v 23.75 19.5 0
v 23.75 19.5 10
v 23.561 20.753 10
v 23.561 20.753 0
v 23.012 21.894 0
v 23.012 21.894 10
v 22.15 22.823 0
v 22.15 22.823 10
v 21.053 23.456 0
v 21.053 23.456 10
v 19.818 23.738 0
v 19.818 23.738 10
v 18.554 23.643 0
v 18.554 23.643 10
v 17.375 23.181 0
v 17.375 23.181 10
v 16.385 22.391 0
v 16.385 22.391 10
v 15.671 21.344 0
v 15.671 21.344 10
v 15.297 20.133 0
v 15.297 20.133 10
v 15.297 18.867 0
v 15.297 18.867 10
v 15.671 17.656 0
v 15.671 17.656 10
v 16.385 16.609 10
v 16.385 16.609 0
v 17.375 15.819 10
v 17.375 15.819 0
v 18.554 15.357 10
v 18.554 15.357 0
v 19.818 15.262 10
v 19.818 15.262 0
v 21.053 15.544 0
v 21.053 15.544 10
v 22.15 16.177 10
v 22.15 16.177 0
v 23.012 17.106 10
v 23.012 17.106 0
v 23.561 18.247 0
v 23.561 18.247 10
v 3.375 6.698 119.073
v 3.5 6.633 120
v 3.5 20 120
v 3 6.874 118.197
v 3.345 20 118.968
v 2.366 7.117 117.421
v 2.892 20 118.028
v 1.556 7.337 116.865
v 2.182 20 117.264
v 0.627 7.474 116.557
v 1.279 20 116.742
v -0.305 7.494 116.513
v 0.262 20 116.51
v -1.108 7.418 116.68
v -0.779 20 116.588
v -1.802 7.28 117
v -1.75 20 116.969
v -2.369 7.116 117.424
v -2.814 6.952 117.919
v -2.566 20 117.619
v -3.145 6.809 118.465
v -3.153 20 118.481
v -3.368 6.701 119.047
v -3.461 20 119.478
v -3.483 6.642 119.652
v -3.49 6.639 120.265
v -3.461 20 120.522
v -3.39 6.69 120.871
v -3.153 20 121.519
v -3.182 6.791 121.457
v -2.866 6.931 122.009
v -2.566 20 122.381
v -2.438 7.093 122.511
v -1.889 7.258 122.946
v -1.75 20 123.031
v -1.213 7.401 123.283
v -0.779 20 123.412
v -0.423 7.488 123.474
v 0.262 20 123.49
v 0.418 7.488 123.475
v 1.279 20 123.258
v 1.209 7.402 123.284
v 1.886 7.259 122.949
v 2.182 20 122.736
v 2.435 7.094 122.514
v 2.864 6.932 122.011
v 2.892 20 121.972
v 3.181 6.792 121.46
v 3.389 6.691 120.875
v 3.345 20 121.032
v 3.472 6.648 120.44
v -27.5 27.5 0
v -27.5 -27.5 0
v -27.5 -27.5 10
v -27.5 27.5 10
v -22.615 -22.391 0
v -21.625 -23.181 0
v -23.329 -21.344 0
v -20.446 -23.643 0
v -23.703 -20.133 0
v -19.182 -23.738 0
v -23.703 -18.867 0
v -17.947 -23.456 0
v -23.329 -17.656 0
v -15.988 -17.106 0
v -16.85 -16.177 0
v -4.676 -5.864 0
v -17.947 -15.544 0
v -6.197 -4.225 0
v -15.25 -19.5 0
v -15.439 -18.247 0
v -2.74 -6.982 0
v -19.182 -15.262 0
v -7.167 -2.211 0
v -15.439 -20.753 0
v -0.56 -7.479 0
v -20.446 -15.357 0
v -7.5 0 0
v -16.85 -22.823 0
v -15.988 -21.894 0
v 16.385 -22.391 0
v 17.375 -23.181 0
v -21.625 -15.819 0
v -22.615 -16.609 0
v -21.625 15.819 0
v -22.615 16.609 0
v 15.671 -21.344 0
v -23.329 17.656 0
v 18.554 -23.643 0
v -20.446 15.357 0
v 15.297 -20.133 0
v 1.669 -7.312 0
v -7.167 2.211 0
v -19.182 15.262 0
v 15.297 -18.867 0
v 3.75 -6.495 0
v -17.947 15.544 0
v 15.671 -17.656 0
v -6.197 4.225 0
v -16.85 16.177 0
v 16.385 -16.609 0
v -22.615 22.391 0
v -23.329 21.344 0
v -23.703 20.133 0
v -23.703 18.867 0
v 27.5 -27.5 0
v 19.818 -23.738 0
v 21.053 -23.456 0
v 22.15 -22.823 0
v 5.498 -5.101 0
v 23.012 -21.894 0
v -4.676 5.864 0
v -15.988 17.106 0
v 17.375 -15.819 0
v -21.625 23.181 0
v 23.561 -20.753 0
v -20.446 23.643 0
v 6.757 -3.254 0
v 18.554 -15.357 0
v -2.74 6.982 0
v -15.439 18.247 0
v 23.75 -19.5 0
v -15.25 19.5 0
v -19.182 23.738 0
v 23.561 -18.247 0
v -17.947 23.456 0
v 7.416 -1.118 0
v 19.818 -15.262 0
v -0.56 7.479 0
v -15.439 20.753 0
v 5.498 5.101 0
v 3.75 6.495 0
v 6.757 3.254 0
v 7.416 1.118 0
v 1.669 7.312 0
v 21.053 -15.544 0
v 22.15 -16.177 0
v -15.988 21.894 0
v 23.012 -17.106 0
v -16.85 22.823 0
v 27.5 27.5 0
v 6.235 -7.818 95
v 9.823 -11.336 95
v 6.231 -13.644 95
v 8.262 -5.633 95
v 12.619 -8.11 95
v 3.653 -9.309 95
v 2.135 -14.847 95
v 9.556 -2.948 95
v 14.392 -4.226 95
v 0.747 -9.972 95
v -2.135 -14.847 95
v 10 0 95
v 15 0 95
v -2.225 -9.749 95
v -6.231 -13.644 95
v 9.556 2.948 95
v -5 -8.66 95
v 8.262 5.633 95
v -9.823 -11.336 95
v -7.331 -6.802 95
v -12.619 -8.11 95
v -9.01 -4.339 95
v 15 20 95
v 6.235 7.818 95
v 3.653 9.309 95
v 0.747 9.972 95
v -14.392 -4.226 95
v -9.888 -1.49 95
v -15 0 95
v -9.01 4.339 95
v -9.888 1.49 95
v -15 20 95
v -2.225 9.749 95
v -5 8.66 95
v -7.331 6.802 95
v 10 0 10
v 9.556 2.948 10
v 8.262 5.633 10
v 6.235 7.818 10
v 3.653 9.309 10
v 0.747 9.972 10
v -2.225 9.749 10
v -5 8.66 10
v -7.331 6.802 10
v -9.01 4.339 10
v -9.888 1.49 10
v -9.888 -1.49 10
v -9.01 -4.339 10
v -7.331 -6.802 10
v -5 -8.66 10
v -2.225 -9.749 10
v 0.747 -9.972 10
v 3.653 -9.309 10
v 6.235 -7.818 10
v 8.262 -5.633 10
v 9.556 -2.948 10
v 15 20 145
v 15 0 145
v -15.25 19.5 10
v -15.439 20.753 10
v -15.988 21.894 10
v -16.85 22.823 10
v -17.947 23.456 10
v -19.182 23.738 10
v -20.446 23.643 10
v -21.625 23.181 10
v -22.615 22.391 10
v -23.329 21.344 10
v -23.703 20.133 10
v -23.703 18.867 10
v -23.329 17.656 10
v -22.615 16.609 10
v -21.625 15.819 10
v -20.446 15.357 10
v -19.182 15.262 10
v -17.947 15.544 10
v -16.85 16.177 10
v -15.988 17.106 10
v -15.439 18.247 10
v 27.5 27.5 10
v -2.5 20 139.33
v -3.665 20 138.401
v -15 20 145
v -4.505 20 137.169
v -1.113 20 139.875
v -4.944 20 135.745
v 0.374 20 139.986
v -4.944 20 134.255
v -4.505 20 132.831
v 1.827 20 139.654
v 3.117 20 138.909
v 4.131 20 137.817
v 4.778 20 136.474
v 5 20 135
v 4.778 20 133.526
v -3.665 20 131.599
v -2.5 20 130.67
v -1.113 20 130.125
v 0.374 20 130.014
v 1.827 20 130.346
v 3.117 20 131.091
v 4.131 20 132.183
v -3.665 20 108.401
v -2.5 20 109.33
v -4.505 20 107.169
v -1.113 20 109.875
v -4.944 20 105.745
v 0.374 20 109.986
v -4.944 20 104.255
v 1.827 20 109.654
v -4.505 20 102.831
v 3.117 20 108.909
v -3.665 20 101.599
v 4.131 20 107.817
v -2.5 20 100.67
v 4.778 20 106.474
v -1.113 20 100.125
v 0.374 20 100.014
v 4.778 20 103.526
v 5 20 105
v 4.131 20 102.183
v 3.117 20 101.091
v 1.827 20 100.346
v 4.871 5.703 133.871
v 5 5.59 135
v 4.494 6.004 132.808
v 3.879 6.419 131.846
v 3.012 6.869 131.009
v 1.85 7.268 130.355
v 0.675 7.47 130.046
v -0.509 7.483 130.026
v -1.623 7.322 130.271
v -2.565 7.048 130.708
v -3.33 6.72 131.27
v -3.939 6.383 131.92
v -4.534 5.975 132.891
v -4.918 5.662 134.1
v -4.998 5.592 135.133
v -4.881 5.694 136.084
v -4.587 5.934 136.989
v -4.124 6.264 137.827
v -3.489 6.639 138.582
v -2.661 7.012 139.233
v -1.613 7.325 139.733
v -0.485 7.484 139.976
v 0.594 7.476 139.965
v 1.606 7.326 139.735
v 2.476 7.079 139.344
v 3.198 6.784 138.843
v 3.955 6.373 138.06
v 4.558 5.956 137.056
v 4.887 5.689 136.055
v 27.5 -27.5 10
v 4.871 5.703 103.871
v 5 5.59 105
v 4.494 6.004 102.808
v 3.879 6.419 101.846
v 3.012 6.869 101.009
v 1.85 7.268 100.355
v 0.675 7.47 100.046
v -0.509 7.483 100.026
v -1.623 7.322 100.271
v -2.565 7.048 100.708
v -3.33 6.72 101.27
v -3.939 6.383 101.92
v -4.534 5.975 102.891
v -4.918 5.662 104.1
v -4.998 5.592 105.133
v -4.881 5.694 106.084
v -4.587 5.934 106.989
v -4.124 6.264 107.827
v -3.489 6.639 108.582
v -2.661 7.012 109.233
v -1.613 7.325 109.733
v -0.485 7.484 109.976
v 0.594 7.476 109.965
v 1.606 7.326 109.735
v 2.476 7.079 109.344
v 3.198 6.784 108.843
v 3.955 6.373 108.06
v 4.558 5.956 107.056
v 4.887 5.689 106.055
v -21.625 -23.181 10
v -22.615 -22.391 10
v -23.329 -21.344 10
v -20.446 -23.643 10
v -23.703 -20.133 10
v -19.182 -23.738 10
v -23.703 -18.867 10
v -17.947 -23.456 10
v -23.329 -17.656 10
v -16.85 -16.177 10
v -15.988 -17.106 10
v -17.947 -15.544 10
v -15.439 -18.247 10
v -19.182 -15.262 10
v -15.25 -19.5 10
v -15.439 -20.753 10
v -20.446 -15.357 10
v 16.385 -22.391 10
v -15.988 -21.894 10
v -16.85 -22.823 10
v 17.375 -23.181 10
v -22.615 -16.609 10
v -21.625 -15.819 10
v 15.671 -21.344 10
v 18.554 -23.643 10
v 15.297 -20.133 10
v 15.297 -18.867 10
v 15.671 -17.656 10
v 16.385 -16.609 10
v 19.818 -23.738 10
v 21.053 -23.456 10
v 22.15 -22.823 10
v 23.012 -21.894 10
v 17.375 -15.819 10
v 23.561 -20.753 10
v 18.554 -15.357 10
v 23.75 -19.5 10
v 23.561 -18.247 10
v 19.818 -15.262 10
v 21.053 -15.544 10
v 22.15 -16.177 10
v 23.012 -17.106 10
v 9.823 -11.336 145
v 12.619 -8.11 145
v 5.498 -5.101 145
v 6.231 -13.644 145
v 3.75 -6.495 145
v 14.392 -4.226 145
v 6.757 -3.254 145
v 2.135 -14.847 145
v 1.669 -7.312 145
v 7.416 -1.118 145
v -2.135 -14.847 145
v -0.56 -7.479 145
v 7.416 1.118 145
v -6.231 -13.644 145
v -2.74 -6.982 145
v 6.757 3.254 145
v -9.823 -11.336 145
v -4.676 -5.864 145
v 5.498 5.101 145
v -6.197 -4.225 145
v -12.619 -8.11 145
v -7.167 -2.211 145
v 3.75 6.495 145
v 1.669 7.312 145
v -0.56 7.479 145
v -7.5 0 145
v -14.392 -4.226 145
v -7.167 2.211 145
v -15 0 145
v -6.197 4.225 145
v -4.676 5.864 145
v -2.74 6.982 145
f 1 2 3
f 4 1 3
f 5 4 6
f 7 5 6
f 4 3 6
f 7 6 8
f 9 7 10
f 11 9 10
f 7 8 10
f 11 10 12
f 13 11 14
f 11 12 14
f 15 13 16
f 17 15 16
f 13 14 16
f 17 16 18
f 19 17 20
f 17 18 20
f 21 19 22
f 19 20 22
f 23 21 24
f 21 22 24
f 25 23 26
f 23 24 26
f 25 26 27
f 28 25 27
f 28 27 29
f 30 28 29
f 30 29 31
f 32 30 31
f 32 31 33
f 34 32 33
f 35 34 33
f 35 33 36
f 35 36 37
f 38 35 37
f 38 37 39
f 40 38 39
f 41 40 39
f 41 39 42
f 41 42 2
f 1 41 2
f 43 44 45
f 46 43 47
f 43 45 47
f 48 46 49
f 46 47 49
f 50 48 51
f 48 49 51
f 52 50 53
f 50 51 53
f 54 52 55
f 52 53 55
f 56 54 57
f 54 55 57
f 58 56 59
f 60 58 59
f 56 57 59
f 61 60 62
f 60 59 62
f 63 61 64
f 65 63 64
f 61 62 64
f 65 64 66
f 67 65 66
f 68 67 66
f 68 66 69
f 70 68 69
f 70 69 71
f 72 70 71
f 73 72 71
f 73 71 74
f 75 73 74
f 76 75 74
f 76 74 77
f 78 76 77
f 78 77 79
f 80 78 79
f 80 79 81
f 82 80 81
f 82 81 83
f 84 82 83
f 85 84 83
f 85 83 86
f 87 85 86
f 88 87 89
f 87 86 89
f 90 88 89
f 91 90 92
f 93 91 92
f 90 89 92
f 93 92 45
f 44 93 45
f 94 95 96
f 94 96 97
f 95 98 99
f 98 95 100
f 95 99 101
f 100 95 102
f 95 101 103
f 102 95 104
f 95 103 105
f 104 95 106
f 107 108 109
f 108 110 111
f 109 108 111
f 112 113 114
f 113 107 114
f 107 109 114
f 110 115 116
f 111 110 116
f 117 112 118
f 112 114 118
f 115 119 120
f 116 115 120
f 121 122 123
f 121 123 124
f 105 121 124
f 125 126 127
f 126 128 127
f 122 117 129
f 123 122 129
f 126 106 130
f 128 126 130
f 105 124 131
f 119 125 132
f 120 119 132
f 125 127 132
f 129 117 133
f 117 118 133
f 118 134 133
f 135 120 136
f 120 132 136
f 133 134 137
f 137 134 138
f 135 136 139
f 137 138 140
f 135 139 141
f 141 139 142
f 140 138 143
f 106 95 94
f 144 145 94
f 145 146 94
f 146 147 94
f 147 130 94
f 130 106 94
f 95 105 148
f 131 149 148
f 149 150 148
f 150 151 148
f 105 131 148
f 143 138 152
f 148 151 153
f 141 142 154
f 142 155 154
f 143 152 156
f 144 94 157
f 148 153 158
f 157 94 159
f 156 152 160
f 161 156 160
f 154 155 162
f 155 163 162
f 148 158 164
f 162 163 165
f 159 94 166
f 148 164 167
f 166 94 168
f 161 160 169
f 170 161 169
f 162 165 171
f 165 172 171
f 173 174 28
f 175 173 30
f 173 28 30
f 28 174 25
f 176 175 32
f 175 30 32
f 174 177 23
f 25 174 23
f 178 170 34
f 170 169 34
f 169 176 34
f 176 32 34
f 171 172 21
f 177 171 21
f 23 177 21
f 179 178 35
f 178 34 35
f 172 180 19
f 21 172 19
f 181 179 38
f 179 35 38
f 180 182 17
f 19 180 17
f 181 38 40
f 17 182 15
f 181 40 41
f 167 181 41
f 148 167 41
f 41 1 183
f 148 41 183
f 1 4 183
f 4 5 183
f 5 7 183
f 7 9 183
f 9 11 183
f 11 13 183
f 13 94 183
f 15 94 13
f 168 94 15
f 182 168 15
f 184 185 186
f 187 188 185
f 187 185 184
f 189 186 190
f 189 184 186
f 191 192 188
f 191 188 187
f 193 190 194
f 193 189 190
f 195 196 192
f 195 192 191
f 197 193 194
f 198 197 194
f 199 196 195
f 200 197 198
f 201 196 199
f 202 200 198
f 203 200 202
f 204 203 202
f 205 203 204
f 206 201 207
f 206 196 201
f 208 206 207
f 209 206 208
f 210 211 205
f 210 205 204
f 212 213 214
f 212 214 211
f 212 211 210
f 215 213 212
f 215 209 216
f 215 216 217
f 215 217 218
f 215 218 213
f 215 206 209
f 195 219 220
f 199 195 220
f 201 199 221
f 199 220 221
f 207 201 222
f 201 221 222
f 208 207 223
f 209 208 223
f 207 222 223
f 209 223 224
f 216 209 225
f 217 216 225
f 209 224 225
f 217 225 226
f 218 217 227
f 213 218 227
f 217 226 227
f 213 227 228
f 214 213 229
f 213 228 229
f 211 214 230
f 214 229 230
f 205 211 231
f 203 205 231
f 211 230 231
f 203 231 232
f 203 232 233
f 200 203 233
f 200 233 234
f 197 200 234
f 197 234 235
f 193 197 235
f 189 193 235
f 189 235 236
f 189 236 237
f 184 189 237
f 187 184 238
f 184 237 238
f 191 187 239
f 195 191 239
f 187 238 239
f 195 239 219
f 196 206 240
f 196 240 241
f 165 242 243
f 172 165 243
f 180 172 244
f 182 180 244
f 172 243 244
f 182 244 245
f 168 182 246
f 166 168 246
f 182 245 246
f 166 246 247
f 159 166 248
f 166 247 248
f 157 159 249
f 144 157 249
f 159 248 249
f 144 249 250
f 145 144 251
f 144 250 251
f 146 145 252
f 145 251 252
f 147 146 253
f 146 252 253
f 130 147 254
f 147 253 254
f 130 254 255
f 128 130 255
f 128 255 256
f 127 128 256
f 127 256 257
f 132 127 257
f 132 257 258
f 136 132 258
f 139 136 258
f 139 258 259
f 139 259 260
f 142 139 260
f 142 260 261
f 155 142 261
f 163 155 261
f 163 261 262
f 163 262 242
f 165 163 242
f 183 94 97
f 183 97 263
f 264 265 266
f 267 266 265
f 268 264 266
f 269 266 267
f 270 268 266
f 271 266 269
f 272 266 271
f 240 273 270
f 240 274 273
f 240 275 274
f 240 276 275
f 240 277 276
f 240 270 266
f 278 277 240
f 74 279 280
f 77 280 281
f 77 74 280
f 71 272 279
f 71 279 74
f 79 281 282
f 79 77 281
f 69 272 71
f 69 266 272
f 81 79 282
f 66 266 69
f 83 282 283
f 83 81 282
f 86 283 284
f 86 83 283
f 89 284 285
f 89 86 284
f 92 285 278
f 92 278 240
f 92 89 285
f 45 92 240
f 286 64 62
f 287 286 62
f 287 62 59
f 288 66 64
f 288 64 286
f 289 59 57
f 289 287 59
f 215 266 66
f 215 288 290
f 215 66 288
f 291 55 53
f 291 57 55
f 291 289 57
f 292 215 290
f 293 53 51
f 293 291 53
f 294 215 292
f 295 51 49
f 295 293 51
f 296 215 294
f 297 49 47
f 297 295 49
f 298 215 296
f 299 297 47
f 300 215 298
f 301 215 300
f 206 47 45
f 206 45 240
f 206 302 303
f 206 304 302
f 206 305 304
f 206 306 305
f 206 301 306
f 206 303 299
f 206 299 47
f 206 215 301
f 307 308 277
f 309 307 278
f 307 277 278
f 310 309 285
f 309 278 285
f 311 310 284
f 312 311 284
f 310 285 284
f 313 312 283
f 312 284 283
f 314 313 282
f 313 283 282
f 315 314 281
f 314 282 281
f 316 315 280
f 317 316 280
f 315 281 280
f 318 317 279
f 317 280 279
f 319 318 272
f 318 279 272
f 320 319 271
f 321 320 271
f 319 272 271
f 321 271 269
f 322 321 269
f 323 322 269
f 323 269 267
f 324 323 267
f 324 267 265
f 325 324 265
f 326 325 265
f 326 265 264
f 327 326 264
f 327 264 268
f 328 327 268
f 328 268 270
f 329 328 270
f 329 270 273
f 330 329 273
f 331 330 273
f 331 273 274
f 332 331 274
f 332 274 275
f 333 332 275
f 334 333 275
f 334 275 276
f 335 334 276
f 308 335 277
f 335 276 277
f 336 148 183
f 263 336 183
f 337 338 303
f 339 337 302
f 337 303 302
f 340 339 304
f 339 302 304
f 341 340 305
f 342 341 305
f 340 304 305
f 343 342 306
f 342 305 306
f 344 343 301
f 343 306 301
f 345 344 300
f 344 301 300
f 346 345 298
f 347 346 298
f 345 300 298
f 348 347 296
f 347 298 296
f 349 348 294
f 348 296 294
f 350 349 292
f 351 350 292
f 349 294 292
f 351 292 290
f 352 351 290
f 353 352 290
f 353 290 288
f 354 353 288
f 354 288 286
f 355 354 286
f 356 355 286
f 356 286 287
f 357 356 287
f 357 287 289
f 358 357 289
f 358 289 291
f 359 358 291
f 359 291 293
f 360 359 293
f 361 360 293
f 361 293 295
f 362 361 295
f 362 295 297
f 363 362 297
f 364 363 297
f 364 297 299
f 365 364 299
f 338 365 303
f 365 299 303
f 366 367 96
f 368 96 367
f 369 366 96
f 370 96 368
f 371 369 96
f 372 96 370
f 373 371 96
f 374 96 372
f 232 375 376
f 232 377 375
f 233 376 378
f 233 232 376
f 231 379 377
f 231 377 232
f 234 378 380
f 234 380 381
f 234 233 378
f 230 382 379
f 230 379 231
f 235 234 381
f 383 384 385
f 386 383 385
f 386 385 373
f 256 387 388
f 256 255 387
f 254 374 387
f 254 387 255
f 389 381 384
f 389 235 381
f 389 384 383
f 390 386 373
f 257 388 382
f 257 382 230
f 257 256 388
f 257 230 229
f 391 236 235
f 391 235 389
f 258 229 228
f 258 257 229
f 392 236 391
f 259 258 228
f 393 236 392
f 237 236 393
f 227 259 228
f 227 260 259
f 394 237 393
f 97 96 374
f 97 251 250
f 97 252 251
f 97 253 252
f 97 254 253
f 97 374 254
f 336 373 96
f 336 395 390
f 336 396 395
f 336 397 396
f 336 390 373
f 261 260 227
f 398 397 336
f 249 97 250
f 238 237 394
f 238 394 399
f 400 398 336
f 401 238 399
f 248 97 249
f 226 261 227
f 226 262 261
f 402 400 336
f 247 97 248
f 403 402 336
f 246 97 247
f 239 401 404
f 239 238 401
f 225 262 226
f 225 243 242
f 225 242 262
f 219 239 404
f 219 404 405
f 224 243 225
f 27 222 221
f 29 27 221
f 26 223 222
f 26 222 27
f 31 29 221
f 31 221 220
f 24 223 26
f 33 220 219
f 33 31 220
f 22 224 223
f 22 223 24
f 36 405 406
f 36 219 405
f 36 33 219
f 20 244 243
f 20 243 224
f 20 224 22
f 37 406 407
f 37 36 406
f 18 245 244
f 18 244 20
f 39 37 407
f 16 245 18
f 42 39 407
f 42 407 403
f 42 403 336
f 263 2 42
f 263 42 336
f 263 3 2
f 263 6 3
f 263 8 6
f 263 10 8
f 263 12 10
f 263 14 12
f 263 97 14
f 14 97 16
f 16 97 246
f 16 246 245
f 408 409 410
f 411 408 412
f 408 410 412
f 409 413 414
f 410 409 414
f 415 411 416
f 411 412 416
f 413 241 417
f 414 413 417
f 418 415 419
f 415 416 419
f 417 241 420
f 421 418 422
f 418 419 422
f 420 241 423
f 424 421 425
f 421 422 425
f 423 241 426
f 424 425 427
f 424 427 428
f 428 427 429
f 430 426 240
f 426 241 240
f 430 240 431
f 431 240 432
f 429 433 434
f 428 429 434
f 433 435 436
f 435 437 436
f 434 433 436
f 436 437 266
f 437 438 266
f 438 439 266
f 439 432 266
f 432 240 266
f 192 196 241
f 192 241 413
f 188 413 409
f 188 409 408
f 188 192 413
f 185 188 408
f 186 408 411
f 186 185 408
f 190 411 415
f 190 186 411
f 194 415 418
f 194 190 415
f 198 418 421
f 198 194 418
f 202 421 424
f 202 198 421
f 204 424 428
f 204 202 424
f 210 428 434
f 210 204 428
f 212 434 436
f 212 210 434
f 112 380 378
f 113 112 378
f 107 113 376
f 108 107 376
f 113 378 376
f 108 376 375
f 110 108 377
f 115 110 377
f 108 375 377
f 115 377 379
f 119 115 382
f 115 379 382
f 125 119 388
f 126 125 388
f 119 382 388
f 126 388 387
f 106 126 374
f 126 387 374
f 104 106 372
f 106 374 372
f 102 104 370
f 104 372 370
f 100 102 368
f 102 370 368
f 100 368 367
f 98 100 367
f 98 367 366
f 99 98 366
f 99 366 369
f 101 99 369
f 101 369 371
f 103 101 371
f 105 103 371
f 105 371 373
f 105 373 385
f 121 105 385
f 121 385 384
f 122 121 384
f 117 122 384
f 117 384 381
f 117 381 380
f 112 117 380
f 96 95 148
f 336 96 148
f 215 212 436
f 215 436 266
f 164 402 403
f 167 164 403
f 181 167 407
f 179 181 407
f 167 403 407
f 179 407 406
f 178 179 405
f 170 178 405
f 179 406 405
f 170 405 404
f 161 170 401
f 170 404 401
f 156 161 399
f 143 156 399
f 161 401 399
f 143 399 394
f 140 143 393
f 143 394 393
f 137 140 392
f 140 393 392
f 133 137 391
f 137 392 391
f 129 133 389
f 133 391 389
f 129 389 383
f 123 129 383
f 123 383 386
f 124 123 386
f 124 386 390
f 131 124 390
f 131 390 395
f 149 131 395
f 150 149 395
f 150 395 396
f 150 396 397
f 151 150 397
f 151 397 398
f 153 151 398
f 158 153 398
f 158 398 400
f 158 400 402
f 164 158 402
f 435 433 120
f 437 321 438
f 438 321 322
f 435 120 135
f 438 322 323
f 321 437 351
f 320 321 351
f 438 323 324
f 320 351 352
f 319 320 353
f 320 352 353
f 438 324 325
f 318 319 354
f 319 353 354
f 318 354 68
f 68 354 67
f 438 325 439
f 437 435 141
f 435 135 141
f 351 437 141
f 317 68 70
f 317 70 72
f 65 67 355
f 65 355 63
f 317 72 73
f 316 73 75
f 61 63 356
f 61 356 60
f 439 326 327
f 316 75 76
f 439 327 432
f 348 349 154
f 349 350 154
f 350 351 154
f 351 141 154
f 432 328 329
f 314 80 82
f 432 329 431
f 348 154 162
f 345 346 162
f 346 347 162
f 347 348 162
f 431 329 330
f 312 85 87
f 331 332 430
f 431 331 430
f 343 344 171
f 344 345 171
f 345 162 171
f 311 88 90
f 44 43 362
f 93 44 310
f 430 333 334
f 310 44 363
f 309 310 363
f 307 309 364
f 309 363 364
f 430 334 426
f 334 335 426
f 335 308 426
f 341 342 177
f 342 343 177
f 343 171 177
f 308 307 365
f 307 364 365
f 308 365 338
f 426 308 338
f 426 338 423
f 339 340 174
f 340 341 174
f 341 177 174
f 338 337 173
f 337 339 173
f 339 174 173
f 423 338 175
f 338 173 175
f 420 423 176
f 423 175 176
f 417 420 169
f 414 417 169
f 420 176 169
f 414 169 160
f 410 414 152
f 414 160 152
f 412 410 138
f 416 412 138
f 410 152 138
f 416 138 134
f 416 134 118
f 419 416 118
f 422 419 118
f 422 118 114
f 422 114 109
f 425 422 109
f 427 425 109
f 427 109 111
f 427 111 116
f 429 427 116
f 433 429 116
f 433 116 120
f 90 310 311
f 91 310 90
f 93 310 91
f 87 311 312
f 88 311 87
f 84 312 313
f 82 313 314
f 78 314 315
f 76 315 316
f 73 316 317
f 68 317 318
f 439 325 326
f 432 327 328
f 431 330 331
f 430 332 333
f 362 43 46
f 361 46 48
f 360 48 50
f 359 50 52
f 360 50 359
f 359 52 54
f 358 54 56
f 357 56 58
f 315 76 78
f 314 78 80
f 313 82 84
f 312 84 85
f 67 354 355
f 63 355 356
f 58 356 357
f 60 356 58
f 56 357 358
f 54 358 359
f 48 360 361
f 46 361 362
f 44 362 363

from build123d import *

# Parameters (mm, degrees)
SKETCH1_W               = 55
SKETCH1_H               = 55
BOSS_EXTRUDE1_DEPTH     = 10
SKETCH2_R               = 10
BOSS_EXTRUDE2_DEPTH     = 85
BOSS_EXTRUDE3_DEPTH     = 50
SKETCH4_R               = 7.5
CUT_EXTRUDE1_DEPTH      = 1
CUT_EXTRUDE1_DEPTH_BACK = 146
CUT_EXTRUDE2_REACH      = 49.5
SKETCH5_R               = 5
SKETCH5_R_2             = 3.5
SKETCH6_R               = 4.25
CUT_EXTRUDE3_DEPTH      = 50


with BuildPart() as part:
    # Sketch1 → Boss-Extrude1 (new body)
    with BuildSketch(Plane.XY):
        Rectangle(SKETCH1_W, SKETCH1_H)
    extrude(amount=BOSS_EXTRUDE1_DEPTH)

    # Sketch2 → Boss-Extrude2 (add)
    with BuildSketch(Plane.XY.offset(10)):
        Circle(SKETCH2_R)
    extrude(amount=BOSS_EXTRUDE2_DEPTH)

    # Sketch3 → Boss-Extrude3 (add)
    with BuildSketch(Plane.XY.offset(95)):
        with BuildLine():
            Line((-15, 0), (-15, 20))
            Line((-15, 20), (15, 20))
            Line((15, 20), (15, 0))
            ThreePointArc((15, 0), (0, -15), (-15, 0))
        make_face()
    extrude(amount=BOSS_EXTRUDE3_DEPTH)

    # Sketch4 → Cut-Extrude1 (cut, two sides)
    with BuildSketch(Plane(origin=(0, 0, 0), x_dir=(-1, 0, 0), z_dir=(0, 0, -1))) as cut_extrude1_sk:
        Circle(SKETCH4_R)
    extrude(amount=CUT_EXTRUDE1_DEPTH, mode=Mode.SUBTRACT)
    extrude(cut_extrude1_sk.sketch, amount=-CUT_EXTRUDE1_DEPTH_BACK, mode=Mode.SUBTRACT)

    # Sketch5 → Cut-Extrude2 (cut, up to next)
    with BuildSketch(Plane(origin=(0, 20, 0), x_dir=(1, 0, 0), z_dir=(0, 1, 0)), mode=Mode.PRIVATE) as cut_extrude2_sk1:
        with Locations((0, -135)):
            Circle(SKETCH5_R)
    cut_extrude2_tool1 = extrude(cut_extrude2_sk1.sketch, amount=-CUT_EXTRUDE2_REACH, mode=Mode.PRIVATE) & part.part
    add(cut_extrude2_tool1.solids().sort_by_distance((0, 20, 135))[0], mode=Mode.SUBTRACT)
    # Sketch5 → Cut-Extrude2 (cut, up to next)
    with BuildSketch(Plane(origin=(0, 20, 0), x_dir=(1, 0, 0), z_dir=(0, 1, 0)), mode=Mode.PRIVATE) as cut_extrude2_sk2:
        with Locations((0, -120)):
            Circle(SKETCH5_R_2)
    cut_extrude2_tool2 = extrude(cut_extrude2_sk2.sketch, amount=-CUT_EXTRUDE2_REACH, mode=Mode.PRIVATE) & part.part
    add(cut_extrude2_tool2.solids().sort_by_distance((0, 20, 120))[0], mode=Mode.SUBTRACT)
    # Sketch5 → Cut-Extrude2 (cut, up to next)
    with BuildSketch(Plane(origin=(0, 20, 0), x_dir=(1, 0, 0), z_dir=(0, 1, 0)), mode=Mode.PRIVATE) as cut_extrude2_sk3:
        with Locations((0, -105)):
            Circle(SKETCH5_R)
    cut_extrude2_tool3 = extrude(cut_extrude2_sk3.sketch, amount=-CUT_EXTRUDE2_REACH, mode=Mode.PRIVATE) & part.part
    add(cut_extrude2_tool3.solids().sort_by_distance((0, 20, 105))[0], mode=Mode.SUBTRACT)

    # Sketch6 → Cut-Extrude3 (cut)
    with BuildSketch(Plane.XY.offset(10)):
        with Locations((-19.5, 19.5)):
            Circle(SKETCH6_R)
        with Locations((19.5, 19.5)):
            Circle(SKETCH6_R)
        with Locations((19.5, -19.5)):
            Circle(SKETCH6_R)
        with Locations((-19.5, -19.5)):
            Circle(SKETCH6_R)
    extrude(amount=-CUT_EXTRUDE3_DEPTH, mode=Mode.SUBTRACT)


solid = part.part
